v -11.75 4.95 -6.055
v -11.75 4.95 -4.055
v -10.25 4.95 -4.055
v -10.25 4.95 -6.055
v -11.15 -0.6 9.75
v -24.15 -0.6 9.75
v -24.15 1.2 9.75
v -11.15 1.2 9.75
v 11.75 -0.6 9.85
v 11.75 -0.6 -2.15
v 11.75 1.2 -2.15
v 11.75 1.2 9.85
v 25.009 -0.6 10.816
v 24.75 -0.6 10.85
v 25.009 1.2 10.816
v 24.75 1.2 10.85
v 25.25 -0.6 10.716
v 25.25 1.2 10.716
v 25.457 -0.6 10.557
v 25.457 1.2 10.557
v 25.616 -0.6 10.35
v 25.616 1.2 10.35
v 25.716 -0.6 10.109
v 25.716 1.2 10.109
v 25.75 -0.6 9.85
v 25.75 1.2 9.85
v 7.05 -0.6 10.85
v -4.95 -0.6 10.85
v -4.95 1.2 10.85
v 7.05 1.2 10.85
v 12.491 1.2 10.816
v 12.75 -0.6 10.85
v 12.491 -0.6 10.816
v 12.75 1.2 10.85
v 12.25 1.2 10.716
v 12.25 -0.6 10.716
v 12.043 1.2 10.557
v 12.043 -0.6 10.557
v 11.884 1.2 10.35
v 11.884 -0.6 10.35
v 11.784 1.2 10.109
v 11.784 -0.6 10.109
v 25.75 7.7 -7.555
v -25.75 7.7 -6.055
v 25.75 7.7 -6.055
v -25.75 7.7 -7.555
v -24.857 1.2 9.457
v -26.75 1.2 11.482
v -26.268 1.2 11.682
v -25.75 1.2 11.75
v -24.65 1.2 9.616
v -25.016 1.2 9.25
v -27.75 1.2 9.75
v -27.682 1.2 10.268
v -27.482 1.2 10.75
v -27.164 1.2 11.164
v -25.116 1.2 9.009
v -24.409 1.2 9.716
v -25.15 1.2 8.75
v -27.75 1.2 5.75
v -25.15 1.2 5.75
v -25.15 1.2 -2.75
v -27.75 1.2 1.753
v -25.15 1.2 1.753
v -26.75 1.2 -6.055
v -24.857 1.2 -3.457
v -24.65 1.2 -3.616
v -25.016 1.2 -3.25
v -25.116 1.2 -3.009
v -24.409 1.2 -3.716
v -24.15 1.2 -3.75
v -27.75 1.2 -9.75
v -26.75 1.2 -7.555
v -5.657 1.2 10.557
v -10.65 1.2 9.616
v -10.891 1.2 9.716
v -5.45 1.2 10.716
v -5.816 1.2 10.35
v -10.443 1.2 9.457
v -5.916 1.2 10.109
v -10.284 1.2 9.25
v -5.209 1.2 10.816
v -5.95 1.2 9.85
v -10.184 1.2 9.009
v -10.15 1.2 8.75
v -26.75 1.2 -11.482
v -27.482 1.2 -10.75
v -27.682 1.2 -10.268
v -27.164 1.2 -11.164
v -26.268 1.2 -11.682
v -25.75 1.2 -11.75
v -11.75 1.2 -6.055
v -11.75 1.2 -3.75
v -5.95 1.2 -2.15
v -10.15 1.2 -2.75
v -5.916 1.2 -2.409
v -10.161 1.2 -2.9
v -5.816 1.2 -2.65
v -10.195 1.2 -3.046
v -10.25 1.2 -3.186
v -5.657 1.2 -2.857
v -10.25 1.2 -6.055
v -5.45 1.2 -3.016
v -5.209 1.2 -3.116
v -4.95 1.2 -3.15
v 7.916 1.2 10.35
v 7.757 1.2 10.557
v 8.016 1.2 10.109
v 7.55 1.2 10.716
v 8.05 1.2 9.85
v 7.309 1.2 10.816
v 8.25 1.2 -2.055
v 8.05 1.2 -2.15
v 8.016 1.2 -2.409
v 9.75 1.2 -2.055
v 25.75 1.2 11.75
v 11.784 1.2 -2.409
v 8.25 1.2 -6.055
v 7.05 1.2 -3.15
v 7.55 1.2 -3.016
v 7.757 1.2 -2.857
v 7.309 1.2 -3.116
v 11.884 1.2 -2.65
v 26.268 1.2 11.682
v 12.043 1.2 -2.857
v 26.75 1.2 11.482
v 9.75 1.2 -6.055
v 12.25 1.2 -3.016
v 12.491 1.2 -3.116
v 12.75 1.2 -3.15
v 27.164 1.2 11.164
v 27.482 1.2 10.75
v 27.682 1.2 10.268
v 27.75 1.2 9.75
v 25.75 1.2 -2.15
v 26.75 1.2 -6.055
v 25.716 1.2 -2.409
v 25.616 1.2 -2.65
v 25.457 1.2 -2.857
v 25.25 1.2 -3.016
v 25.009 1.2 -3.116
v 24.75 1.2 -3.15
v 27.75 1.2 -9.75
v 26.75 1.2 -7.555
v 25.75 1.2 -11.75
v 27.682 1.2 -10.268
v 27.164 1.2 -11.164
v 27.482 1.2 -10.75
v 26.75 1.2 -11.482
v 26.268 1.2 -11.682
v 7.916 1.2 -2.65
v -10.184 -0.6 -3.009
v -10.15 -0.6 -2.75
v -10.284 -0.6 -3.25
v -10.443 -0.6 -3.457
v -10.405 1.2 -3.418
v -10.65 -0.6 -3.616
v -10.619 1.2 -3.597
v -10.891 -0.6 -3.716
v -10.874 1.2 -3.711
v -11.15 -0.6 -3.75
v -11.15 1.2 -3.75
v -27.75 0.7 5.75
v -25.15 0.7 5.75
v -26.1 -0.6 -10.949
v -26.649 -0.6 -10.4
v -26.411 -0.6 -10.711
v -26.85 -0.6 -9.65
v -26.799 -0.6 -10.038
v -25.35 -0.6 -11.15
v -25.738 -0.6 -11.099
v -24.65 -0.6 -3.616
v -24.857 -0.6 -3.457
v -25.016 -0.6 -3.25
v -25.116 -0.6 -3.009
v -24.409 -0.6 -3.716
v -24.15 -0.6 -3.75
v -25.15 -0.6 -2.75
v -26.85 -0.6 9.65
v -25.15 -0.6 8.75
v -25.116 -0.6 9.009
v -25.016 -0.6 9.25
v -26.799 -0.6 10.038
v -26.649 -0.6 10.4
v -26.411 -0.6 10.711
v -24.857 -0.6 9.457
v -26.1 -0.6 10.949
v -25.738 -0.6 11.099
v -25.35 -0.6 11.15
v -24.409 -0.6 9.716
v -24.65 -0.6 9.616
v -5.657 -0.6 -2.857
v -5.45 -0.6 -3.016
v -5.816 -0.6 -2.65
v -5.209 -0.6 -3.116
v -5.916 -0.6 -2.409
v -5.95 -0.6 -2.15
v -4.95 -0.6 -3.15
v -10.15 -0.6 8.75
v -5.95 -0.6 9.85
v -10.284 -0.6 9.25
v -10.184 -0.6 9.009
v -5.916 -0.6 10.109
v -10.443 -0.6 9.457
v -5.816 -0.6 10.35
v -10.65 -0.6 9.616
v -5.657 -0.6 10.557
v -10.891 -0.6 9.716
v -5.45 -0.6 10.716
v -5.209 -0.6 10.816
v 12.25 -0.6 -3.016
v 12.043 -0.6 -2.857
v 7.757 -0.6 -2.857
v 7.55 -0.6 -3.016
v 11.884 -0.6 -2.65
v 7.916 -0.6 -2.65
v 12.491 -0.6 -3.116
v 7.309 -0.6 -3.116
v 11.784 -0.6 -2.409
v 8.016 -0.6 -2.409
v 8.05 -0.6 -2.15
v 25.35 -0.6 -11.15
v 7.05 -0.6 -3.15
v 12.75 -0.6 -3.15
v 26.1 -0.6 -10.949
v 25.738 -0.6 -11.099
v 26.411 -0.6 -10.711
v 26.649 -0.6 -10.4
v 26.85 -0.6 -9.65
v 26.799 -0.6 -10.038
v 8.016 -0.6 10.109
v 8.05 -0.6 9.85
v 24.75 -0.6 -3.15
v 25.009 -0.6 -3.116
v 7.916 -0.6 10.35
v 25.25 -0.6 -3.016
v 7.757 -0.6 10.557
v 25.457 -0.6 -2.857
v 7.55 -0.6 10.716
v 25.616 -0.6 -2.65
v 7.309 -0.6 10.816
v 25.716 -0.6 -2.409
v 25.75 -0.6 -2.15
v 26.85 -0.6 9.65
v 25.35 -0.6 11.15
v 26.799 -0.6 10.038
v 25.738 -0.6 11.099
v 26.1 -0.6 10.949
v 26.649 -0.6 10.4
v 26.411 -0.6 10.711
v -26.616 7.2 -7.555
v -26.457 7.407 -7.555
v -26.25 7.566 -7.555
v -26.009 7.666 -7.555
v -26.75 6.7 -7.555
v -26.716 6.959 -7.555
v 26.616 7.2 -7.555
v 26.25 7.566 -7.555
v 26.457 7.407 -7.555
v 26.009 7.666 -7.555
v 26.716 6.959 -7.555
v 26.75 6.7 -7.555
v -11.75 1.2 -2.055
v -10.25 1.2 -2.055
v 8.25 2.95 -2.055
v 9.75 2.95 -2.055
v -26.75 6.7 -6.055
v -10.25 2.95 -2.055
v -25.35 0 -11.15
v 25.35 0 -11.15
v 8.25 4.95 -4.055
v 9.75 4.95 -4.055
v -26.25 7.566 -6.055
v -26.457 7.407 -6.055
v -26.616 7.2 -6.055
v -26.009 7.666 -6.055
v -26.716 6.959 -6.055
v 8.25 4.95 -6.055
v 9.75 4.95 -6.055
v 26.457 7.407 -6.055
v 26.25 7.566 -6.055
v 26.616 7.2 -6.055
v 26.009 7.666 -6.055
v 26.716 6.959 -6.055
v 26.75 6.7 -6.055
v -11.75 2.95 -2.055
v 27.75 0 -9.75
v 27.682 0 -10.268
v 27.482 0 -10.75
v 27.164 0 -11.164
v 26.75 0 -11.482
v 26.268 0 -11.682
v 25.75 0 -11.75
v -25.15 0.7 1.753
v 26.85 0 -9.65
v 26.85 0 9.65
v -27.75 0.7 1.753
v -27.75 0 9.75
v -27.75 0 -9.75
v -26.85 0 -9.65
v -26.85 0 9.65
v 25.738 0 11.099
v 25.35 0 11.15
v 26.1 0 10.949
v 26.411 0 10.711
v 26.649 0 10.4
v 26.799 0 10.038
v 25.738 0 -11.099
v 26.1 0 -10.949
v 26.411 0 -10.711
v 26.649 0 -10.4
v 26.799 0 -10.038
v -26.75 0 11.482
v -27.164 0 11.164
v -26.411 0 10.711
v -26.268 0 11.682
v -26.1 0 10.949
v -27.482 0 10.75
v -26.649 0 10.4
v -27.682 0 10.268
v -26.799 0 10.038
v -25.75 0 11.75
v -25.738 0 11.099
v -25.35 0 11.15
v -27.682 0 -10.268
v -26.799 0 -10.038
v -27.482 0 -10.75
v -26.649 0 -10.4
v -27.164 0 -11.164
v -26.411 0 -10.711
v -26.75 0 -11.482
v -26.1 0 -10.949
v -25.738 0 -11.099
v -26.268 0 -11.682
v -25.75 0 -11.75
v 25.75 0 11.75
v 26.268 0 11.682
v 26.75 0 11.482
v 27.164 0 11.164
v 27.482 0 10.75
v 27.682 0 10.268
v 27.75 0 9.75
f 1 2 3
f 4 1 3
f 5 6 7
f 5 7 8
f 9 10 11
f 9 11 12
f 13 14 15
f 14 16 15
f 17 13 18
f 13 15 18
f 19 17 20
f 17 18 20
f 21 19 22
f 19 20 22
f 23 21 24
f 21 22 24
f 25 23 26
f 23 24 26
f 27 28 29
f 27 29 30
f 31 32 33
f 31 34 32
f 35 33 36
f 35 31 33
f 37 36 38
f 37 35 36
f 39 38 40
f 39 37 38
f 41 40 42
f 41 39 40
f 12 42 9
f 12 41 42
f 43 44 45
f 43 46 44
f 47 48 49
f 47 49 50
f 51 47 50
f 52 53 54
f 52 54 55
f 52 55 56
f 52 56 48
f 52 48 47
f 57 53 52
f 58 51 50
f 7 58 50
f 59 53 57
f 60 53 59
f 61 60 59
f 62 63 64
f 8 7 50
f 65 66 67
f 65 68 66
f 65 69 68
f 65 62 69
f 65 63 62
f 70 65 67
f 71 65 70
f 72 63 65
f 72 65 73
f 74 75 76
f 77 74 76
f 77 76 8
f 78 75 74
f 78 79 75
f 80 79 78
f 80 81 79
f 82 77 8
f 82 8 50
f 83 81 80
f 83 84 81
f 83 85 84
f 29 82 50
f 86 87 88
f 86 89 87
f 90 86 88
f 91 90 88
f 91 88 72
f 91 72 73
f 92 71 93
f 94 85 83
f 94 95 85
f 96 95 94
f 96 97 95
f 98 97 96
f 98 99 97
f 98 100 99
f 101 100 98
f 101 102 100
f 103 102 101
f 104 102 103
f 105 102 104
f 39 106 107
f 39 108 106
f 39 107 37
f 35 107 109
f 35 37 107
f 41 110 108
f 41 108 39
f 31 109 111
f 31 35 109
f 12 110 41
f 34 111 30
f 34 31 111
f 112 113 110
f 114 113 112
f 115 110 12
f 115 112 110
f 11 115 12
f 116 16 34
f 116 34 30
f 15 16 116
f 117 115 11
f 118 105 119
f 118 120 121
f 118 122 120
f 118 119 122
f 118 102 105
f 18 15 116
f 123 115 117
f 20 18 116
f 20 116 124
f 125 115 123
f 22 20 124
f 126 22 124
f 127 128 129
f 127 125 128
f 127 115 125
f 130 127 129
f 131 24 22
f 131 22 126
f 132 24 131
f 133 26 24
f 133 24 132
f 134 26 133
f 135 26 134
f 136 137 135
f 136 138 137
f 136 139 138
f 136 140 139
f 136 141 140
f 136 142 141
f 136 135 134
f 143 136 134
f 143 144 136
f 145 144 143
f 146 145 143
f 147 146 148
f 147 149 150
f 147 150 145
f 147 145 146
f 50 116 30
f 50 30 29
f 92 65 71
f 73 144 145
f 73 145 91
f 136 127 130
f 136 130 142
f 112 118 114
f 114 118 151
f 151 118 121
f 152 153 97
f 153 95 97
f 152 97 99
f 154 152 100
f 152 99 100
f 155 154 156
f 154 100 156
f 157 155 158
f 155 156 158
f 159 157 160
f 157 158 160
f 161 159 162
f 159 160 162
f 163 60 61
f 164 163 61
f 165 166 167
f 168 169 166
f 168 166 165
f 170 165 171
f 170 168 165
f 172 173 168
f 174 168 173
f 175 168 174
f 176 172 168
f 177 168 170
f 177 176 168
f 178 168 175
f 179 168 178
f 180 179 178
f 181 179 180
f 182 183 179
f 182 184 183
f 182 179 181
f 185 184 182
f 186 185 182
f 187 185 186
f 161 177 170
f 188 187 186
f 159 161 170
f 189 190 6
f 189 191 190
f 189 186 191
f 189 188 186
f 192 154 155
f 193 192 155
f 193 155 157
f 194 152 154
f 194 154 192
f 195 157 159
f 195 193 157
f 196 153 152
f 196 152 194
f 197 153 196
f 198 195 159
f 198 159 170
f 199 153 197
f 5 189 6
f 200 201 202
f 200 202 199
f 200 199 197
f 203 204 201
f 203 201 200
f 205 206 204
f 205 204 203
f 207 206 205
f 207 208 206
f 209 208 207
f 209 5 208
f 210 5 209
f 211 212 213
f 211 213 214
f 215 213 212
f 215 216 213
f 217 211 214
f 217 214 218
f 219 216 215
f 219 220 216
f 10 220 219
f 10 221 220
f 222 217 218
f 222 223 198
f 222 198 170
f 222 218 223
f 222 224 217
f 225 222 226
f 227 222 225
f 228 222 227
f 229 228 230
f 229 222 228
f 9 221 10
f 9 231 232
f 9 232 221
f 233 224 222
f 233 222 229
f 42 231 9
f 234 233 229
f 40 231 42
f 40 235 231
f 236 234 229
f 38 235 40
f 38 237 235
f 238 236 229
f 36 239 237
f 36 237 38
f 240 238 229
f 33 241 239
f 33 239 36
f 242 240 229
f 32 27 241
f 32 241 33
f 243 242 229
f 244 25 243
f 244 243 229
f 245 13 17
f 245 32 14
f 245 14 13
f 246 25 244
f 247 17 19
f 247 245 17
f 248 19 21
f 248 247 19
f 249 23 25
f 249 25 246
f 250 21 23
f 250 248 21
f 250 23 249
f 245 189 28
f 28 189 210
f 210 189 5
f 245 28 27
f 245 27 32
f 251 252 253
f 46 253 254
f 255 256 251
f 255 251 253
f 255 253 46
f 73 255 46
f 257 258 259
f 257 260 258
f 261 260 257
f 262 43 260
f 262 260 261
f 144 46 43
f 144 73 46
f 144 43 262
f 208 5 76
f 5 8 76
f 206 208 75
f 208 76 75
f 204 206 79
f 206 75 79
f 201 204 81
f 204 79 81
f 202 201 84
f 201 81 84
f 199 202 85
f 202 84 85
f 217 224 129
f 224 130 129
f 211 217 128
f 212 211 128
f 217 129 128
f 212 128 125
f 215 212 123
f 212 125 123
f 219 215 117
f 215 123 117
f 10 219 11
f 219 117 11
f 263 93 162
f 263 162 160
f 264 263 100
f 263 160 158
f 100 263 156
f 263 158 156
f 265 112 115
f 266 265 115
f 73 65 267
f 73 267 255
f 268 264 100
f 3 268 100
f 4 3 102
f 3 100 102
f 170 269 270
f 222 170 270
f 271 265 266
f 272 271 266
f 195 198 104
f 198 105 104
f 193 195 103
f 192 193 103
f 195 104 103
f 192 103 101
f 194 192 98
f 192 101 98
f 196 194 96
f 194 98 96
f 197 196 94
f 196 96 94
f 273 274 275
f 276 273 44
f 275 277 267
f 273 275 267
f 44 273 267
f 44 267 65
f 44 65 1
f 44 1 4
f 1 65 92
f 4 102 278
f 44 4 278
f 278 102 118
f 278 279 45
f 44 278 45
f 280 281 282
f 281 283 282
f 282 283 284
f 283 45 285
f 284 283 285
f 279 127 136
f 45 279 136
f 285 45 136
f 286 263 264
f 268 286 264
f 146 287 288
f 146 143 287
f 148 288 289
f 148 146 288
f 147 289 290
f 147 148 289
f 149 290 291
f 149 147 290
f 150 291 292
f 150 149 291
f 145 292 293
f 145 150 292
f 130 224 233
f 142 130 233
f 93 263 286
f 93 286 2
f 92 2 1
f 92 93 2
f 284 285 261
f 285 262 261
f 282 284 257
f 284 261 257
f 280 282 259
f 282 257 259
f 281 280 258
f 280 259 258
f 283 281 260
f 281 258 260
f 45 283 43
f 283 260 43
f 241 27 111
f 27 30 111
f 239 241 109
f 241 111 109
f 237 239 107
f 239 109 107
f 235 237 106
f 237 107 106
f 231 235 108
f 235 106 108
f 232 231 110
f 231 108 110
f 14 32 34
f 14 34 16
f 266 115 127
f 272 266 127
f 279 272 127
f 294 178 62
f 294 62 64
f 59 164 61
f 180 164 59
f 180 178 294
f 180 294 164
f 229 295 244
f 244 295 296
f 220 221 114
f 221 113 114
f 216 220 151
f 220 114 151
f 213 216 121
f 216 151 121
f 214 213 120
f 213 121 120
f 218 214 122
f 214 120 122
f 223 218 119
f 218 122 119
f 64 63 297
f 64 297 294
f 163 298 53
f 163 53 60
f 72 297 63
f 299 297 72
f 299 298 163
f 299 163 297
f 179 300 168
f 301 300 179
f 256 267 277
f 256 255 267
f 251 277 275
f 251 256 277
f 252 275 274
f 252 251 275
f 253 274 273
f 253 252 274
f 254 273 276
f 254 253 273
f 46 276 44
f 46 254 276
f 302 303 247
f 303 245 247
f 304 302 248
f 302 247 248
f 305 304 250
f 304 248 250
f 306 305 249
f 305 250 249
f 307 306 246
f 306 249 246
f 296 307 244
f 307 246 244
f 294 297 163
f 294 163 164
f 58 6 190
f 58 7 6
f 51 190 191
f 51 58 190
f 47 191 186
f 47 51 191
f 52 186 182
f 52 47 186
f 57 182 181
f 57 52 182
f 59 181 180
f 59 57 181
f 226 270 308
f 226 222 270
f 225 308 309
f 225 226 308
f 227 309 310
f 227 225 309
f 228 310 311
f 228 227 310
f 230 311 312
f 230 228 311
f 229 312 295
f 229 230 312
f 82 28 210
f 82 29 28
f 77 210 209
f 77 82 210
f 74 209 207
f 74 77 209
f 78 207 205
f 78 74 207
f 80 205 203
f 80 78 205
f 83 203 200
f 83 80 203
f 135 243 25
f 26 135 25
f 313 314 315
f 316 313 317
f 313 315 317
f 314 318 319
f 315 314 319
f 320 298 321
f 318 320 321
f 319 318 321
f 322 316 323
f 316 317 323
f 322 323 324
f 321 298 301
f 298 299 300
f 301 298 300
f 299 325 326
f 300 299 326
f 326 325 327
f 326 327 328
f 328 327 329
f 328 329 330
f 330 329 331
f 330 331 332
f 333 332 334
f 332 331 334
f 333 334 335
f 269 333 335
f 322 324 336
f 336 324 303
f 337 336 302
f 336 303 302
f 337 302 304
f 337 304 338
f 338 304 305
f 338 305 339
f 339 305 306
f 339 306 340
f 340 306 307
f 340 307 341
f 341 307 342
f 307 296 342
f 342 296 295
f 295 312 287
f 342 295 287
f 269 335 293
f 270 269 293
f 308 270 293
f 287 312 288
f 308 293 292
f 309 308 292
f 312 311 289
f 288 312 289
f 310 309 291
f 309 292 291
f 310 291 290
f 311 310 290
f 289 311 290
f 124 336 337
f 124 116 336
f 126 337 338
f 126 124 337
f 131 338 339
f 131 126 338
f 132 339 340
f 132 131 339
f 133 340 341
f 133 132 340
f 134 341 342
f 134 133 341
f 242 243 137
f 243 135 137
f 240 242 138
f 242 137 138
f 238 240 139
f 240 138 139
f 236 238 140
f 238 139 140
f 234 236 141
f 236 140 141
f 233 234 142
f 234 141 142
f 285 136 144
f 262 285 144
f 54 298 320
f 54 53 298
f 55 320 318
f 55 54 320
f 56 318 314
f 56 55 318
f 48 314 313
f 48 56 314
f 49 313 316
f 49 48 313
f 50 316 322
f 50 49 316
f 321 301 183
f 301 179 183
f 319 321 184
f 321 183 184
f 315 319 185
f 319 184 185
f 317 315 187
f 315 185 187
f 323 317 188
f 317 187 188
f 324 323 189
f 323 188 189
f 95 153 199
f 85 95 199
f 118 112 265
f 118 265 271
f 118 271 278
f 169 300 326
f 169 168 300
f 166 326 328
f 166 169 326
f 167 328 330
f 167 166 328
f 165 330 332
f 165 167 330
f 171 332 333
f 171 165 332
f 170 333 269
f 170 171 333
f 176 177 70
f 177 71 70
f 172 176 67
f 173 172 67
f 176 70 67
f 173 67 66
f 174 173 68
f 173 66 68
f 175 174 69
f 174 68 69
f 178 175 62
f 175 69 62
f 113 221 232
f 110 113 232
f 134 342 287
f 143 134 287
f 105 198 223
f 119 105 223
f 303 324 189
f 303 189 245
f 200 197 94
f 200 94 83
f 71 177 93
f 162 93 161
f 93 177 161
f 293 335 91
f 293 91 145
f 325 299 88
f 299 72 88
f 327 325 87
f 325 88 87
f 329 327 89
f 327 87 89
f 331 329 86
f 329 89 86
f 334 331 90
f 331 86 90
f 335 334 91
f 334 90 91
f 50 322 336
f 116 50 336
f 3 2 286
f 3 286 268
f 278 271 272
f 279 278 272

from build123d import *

# Parameters (mm, degrees)
SKETCH_1_W          = 55.5
SKETCH_1_H          = 23.5
EXTRUDE_1_DEPTH     = 1.2
FILLET_1_R          = 2
SKETCH_2_W          = 53.7
SKETCH_2_H          = 22.3
EXTRUDE_2_DEPTH     = 0.6
SKETCH_3_W          = 15
SKETCH_3_H          = 13.5
SKETCH_3_W_2        = 14
SKETCH_3_H_2        = 14
CUT_EXTRUDE_1_DEPTH = 3
FILLET_2_R          = 1
SKETCH_4_W          = 15.5
SKETCH_4_H          = 3.997435945
CUT_EXTRUDE_2_DEPTH = 0.5
SKETCH_5_W          = 53.5
SKETCH_5_H          = 1.5
EXTRUDE_3_DEPTH     = 6.5
FILLET_3_R          = 1
SKETCH_6_W          = 1.5
SKETCH_6_H          = 4
EXTRUDE_4_DEPTH     = 3.75
CHAMFER_1_SIZE      = 2
FILLET_4_R          = 1.5


with BuildPart() as part:
    # 草图1 → 凸台-拉伸1 (new body)
    with BuildSketch(Plane(origin=(0, 0, 0), x_dir=(1, 0, 0), z_dir=(0, 1, 0))):
        Rectangle(SKETCH_1_W, SKETCH_1_H)
    extrude(amount=EXTRUDE_1_DEPTH)

    # 圆角1
    fillet_1_edges = [part.edges().sort_by_distance(p)[0] for p in [
        (27.75, 0.6, 11.75),
        (-27.75, 0.6, 11.75),
        (-27.75, 0.6, -11.75),
        (27.75, 0.6, -11.75),
    ]]
    fillet(fillet_1_edges, radius=FILLET_1_R)

    # 草图2 → 凸台-拉伸2 (add)
    with BuildSketch(Plane.XZ):
        Rectangle(SKETCH_2_W, SKETCH_2_H)
    extrude(amount=EXTRUDE_2_DEPTH)

    # 草图3 → 切除-拉伸1 (cut)
    with BuildSketch(Plane.XZ.offset(0.6)):
        with Locations((-17.65, 3)):
            Rectangle(SKETCH_3_W, SKETCH_3_H)
        with Locations((1.05, 3.85)):
            Rectangle(SKETCH_3_W_2, SKETCH_3_H_2)
        with Locations((18.75, 3.85)):
            Rectangle(SKETCH_3_W_2, SKETCH_3_H_2)
    extrude(amount=-CUT_EXTRUDE_1_DEPTH, mode=Mode.SUBTRACT)

    # 圆角2
    fillet_2_edges = [part.edges().sort_by_distance(p)[0] for p in [
        (-25.15, 0.3, -3.75),
        (-25.15, 0.3, 9.75),
        (-10.15, 0.3, 9.75),
        (-10.15, 0.3, -3.75),
        (-5.95, 0.3, -3.15),
        (-5.95, 0.3, 10.85),
        (8.05, 0.3, 10.85),
        (8.05, 0.3, -3.15),
        (11.75, 0.3, -3.15),
        (11.75, 0.3, 10.85),
        (25.75, 0.3, 10.85),
        (25.75, 0.3, -3.15),
    ]]
    fillet(fillet_2_edges, radius=FILLET_2_R)

    # 草图4 → 切除-拉伸2 (cut)
    with BuildSketch(Plane(origin=(0, 1.2, 0), x_dir=(1, 0, 0), z_dir=(0, 1, 0))):
        with Locations((-20, -3.751282028)):
            Rectangle(SKETCH_4_W, SKETCH_4_H)
    extrude(amount=-CUT_EXTRUDE_2_DEPTH, mode=Mode.SUBTRACT)

    # 草图5 → 凸台-拉伸3 (add)
    with BuildSketch(Plane(origin=(0, 1.2, 0), x_dir=(1, 0, 0), z_dir=(0, 1, 0))):
        with Locations((0, 6.804632487)):
            Rectangle(SKETCH_5_W, SKETCH_5_H)
    extrude(amount=EXTRUDE_3_DEPTH)

    # 圆角3
    fillet_3_edges = [part.edges().sort_by_distance(p)[0] for p in [
        (26.75, 7.7, -6.804632487),
        (-26.75, 7.7, -6.804632487),
    ]]
    fillet(fillet_3_edges, radius=FILLET_3_R)

    # 草图6 → 凸台-拉伸4 (add)
    with BuildSketch(Plane(origin=(0, 1.2, 0), x_dir=(1, 0, 0), z_dir=(0, 1, 0))):
        with Locations((9, 4.054632487)):
            Rectangle(SKETCH_6_W, SKETCH_6_H)
        with Locations((-11, 4.054632487)):
            Rectangle(SKETCH_6_W, SKETCH_6_H)
    extrude(amount=EXTRUDE_4_DEPTH)

    # 倒角1
    chamfer_1_edges = [part.edges().sort_by_distance(p)[0] for p in [
        (9, 4.95, -2.054632487),
        (-11, 4.95, -2.054632487),
    ]]
    chamfer(chamfer_1_edges, length=CHAMFER_1_SIZE)

    # 圆角4
    fillet_4_edges = [part.edges().sort_by_distance(p)[0] for p in [
        (-26.85, -0.3, 11.15),
        (-26.85, -0.3, -11.15),
        (26.85, -0.3, -11.15),
        (26.85, -0.3, 11.15),
    ]]
    fillet(fillet_4_edges, radius=FILLET_4_R)


solid = part.part
